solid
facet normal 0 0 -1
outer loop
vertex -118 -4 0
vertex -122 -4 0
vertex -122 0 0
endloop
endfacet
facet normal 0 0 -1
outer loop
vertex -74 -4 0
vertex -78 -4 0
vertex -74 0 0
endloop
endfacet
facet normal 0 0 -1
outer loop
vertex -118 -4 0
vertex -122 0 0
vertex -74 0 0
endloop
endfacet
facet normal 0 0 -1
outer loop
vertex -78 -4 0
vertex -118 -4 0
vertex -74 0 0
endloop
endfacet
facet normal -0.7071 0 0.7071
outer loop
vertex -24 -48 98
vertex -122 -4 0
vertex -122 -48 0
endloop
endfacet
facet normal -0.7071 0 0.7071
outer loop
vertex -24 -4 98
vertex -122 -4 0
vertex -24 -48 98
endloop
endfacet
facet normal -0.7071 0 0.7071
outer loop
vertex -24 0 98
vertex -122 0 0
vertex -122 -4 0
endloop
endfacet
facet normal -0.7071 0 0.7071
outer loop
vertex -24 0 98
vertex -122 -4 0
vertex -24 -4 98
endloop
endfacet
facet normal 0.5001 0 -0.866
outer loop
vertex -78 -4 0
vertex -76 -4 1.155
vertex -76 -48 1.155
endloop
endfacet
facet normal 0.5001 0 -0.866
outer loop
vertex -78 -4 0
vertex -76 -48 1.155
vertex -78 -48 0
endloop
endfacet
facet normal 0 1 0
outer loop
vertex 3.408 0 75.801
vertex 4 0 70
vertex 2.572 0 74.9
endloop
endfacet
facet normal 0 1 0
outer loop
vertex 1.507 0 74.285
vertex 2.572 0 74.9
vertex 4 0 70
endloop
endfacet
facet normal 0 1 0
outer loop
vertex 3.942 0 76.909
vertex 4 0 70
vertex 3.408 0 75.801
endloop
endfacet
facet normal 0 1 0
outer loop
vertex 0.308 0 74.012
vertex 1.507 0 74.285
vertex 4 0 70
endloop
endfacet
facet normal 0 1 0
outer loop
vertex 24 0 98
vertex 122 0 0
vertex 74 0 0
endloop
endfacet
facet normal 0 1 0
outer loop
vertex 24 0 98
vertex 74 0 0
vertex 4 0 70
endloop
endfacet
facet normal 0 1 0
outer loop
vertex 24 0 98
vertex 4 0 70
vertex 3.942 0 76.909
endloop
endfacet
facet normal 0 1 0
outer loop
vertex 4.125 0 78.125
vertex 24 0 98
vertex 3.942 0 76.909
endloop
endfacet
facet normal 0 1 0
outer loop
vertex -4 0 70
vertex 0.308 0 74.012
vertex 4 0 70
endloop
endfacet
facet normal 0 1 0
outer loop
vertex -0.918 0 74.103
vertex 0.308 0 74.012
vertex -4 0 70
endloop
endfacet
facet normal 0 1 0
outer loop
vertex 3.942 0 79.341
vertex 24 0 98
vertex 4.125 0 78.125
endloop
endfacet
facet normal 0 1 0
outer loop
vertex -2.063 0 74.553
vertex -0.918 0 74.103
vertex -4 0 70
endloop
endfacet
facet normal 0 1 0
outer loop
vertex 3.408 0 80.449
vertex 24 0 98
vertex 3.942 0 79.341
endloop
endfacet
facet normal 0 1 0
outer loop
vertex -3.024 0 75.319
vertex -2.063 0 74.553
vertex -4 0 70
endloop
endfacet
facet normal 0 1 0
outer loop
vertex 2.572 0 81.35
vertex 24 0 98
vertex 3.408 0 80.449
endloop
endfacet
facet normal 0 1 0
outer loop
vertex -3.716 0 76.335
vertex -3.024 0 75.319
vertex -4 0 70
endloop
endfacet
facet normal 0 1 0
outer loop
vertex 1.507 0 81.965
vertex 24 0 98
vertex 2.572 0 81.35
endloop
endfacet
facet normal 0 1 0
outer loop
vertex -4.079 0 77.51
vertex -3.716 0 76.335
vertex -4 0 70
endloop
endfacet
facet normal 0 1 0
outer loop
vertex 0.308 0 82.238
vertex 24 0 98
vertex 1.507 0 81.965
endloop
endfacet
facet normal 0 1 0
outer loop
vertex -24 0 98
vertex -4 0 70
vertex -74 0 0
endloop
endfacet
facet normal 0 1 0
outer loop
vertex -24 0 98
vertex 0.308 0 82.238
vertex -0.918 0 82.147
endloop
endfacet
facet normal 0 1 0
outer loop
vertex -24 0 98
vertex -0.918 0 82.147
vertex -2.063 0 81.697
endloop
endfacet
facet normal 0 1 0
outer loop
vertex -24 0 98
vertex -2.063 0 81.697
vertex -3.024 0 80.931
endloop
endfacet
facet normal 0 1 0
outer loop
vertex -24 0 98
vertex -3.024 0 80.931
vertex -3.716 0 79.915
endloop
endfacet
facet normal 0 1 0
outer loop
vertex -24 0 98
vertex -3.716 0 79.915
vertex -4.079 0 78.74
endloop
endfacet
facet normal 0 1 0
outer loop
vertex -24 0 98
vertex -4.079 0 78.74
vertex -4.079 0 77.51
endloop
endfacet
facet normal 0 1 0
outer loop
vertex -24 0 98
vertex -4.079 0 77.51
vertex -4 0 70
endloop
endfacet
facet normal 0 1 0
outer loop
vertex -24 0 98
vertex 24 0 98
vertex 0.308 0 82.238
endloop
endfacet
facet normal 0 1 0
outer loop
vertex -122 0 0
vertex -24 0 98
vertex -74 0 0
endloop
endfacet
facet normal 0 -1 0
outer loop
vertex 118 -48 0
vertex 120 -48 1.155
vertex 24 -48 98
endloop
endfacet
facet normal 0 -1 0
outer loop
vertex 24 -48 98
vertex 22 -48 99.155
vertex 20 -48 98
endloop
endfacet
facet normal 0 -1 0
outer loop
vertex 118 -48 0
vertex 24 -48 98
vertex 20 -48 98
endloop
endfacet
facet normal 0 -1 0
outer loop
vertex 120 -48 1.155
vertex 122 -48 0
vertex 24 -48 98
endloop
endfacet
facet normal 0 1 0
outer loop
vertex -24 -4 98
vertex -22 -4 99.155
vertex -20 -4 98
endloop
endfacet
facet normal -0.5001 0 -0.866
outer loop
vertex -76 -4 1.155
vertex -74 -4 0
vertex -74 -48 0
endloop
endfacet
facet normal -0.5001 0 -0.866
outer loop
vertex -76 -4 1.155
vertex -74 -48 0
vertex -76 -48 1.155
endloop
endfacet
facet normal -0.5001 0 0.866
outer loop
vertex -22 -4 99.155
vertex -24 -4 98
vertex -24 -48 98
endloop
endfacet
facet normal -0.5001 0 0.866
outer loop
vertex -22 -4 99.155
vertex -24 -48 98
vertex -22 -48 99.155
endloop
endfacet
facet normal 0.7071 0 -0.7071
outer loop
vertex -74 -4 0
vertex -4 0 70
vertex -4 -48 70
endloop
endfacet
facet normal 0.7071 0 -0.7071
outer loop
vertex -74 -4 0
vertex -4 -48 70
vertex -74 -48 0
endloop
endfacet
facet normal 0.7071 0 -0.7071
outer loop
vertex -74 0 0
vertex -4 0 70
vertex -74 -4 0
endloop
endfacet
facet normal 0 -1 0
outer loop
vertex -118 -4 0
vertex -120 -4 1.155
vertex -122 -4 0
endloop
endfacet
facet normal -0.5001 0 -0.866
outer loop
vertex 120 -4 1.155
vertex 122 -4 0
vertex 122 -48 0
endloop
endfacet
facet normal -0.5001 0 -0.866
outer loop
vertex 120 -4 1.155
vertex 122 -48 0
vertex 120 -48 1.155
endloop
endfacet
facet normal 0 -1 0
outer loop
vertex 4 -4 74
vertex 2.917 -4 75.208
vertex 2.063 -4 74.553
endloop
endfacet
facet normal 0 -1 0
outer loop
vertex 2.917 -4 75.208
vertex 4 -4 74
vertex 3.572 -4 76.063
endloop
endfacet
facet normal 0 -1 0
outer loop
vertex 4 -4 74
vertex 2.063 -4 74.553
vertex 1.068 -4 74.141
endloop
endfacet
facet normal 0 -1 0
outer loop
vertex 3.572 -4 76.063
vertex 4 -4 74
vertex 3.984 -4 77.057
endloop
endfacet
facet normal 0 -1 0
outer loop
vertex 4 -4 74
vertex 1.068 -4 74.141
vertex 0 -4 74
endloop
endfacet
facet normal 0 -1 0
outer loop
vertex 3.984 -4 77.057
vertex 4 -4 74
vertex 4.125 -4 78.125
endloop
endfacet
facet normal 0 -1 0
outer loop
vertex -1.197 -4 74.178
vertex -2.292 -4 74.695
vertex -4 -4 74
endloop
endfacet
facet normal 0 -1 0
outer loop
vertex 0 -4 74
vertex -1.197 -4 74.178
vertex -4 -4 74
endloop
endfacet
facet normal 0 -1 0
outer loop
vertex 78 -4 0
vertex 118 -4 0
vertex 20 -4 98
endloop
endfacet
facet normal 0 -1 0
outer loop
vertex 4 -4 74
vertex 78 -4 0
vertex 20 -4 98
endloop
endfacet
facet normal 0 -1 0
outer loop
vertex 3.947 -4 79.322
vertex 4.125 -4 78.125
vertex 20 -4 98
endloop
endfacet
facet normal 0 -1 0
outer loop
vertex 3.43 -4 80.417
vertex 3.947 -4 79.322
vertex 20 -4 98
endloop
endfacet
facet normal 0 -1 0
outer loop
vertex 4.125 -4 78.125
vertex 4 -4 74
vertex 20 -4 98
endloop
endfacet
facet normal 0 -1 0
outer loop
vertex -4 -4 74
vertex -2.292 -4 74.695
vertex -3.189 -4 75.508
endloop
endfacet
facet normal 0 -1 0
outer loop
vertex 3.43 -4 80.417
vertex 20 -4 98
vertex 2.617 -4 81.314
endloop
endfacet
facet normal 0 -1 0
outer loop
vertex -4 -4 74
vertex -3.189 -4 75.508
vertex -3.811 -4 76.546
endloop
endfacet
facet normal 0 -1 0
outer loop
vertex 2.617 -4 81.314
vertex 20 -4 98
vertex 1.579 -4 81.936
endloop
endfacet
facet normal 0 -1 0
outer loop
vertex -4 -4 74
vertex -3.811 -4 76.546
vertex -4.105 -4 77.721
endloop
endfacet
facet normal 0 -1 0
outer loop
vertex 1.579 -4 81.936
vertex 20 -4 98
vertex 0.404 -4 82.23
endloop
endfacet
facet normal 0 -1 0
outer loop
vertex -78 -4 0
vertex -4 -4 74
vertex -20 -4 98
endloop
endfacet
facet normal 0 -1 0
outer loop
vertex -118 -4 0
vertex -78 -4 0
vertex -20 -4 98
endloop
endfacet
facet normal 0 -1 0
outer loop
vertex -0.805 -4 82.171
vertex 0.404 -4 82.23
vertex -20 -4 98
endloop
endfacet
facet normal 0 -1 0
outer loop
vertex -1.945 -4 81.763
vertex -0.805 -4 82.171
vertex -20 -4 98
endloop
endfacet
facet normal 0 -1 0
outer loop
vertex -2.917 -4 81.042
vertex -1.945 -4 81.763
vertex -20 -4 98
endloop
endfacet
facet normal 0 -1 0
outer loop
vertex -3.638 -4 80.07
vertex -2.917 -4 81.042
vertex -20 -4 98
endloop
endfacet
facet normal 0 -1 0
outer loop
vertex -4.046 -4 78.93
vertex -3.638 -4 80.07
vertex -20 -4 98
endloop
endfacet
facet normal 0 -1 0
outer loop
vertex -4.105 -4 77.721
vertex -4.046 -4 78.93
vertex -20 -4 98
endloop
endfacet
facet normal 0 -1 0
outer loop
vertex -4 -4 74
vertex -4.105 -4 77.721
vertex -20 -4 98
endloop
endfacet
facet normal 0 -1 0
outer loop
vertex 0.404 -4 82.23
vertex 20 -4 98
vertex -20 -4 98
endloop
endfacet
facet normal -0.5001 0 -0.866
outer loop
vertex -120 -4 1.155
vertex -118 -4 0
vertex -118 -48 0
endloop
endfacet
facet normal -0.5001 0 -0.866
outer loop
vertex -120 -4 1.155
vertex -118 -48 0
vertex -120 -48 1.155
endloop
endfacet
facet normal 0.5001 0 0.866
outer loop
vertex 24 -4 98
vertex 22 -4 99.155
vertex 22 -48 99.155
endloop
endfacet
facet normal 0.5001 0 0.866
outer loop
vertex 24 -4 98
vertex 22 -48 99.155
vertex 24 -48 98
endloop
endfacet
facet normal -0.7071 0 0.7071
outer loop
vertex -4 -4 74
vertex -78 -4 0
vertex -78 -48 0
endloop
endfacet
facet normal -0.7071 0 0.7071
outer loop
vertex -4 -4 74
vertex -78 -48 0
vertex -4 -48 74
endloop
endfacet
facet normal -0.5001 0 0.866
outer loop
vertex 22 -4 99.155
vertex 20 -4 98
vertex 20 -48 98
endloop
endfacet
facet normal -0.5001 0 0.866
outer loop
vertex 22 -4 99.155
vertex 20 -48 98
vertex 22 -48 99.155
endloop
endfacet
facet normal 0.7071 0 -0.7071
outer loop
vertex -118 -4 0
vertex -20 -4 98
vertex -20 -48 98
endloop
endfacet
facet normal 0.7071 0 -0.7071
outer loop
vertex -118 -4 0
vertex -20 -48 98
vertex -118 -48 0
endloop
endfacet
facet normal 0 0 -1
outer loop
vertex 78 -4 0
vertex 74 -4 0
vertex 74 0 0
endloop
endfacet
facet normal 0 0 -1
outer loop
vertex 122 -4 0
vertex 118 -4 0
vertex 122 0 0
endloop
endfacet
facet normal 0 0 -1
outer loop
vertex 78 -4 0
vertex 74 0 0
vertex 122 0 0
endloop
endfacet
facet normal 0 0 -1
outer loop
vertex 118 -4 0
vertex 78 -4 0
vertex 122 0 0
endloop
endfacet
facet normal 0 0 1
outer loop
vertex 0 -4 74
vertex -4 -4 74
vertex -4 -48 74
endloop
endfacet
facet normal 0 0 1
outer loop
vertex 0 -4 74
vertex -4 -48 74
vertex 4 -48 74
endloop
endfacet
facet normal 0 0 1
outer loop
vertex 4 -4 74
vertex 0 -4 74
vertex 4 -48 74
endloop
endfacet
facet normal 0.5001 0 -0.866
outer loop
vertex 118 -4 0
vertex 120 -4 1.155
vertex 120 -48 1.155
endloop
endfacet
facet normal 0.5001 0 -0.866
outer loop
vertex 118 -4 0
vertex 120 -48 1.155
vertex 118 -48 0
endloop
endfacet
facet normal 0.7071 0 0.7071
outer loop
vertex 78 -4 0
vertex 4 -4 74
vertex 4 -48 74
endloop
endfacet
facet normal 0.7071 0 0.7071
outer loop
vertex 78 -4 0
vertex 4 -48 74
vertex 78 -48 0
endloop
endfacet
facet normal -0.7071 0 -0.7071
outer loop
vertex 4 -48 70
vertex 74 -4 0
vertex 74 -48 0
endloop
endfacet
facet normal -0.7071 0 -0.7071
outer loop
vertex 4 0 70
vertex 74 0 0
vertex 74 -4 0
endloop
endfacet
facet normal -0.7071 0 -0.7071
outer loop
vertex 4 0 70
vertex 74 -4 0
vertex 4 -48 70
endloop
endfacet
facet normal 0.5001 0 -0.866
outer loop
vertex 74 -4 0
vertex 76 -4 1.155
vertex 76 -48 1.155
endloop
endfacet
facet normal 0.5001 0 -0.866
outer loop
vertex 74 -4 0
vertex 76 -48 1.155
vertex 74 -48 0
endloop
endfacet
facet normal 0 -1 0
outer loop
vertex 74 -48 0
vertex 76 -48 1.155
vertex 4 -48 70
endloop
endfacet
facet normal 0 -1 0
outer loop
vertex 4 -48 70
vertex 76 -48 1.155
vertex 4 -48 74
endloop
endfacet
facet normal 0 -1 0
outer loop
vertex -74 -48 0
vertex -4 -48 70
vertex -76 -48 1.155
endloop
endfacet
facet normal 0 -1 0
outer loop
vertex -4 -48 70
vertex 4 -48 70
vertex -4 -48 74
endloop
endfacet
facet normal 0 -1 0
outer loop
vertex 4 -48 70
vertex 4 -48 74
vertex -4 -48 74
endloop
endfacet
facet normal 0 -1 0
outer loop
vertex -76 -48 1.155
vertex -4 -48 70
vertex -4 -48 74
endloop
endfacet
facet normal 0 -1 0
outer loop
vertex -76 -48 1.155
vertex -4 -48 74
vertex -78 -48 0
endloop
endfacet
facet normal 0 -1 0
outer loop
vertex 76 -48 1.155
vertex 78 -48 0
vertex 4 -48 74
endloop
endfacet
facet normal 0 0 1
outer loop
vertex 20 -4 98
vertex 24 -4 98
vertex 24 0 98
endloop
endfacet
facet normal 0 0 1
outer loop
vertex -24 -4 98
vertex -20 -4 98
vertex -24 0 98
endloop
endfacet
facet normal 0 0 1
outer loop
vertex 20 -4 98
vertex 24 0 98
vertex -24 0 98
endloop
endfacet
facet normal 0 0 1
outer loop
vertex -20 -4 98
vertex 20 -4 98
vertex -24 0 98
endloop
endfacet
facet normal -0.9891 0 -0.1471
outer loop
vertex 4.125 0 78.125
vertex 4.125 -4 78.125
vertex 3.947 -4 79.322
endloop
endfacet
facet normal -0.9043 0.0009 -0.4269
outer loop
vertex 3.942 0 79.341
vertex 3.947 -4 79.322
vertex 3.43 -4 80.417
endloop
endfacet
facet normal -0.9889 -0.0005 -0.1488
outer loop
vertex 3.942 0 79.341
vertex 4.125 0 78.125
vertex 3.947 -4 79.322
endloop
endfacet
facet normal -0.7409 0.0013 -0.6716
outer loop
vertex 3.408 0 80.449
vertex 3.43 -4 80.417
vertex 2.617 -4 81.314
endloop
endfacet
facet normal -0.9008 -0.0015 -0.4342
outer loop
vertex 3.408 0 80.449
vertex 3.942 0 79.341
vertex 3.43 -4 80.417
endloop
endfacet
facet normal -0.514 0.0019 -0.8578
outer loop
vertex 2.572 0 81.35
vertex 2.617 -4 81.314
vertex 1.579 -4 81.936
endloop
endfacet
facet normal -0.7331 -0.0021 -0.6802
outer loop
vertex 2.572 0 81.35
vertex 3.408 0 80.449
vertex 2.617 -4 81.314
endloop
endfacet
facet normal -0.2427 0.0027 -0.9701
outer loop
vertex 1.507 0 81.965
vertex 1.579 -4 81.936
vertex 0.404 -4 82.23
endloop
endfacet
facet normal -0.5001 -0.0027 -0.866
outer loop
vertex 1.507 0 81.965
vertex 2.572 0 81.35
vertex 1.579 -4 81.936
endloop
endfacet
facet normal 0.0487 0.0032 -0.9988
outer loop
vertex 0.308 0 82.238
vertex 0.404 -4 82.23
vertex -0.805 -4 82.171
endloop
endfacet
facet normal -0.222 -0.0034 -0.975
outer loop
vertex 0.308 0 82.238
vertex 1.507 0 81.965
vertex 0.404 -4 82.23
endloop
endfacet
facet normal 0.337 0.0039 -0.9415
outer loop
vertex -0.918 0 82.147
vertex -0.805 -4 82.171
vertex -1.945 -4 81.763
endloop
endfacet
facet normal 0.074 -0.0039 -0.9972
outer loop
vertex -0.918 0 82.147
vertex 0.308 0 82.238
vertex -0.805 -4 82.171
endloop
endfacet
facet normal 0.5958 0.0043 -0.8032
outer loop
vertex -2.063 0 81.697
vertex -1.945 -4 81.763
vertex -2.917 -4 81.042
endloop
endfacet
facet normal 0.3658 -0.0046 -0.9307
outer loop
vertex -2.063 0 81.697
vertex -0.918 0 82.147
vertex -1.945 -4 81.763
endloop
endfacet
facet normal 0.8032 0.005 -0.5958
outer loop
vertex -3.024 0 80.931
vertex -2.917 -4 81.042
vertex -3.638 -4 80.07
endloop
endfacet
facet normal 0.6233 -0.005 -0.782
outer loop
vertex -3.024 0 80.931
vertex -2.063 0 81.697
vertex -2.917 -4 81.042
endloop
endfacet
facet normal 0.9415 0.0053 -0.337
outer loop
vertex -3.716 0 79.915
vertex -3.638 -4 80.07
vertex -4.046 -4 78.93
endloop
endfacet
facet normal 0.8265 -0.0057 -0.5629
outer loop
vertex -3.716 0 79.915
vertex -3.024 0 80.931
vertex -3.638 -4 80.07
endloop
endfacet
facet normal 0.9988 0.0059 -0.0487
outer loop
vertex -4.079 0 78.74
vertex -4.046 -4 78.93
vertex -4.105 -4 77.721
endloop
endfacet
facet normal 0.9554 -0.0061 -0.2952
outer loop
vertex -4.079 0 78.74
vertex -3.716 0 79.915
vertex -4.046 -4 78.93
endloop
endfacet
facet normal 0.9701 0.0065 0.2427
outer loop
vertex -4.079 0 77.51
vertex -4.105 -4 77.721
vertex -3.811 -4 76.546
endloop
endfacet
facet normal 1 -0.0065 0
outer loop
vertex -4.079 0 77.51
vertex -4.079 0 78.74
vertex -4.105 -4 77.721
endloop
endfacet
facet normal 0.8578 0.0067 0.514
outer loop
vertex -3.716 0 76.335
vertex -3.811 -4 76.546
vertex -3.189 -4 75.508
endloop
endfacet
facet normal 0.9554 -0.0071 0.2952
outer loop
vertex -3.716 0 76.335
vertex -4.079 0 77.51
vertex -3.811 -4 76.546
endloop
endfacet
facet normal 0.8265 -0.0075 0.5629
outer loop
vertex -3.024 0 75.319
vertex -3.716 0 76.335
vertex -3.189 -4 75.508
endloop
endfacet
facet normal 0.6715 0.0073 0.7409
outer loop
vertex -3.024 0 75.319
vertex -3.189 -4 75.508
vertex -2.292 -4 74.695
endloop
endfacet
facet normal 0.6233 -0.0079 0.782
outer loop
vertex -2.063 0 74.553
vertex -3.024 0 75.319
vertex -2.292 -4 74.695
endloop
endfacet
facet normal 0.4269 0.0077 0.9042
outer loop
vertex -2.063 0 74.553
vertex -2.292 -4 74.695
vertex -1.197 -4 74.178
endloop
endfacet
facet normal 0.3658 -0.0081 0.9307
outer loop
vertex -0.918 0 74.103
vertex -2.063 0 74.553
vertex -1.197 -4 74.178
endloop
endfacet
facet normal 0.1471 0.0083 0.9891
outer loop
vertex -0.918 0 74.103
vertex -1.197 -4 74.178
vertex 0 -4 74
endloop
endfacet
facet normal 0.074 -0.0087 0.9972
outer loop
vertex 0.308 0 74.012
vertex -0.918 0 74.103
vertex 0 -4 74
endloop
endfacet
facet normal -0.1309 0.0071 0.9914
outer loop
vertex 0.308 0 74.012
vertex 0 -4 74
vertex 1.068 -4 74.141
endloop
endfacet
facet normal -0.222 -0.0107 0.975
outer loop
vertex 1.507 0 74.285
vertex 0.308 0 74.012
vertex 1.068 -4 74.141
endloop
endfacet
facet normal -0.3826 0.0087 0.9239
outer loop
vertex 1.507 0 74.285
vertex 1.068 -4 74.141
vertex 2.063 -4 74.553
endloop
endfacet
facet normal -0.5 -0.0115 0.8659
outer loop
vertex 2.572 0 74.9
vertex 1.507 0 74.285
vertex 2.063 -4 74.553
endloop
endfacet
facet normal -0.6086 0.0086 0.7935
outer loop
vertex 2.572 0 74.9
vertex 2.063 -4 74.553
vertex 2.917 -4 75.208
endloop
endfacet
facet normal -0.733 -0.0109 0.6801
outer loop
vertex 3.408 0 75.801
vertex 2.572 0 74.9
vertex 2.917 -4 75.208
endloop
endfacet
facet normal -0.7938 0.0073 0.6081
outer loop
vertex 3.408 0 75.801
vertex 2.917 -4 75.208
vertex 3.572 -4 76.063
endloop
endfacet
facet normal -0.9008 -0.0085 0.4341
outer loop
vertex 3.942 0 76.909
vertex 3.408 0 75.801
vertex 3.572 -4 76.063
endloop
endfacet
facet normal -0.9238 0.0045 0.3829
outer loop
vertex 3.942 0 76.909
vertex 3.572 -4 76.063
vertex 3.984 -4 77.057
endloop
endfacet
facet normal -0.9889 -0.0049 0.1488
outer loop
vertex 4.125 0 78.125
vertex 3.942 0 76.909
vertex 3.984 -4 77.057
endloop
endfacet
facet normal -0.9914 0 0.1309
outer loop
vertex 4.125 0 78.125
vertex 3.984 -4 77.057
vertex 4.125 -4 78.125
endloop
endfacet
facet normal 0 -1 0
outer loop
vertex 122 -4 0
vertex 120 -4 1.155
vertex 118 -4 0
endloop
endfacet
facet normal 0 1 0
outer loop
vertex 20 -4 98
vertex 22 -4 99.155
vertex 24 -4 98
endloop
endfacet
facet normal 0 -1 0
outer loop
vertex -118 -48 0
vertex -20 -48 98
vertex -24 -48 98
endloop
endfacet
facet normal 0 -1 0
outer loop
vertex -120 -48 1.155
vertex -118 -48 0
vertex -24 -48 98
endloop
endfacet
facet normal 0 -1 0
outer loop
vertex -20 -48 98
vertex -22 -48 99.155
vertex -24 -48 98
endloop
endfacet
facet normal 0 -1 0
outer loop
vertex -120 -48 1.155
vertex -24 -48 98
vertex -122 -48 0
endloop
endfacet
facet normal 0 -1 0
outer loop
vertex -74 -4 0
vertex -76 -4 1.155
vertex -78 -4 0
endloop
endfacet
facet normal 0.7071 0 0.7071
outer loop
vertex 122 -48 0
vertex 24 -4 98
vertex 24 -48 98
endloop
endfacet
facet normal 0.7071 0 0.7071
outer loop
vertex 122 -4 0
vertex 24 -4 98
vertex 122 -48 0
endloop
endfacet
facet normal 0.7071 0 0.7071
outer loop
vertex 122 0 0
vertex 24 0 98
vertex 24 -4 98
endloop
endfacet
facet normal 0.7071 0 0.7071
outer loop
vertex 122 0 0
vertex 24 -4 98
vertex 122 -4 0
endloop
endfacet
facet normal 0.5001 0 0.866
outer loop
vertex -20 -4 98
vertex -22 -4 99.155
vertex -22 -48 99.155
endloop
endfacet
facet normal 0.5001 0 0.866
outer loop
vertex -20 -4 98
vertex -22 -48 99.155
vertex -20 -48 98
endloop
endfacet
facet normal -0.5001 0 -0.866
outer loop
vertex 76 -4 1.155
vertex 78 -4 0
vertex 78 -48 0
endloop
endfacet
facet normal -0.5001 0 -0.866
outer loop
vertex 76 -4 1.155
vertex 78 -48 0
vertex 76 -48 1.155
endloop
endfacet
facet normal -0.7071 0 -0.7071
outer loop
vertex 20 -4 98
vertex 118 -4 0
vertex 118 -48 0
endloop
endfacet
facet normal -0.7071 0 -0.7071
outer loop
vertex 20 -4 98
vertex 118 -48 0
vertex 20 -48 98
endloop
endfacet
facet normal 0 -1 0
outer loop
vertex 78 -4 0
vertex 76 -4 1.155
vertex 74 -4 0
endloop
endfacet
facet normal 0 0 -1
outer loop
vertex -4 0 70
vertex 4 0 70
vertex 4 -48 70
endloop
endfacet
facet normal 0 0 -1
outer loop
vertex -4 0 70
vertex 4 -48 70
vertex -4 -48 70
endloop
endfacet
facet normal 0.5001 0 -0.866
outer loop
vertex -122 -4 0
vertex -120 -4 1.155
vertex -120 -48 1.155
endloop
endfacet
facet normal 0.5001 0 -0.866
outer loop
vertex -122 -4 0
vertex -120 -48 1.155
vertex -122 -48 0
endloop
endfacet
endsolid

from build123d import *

# Parameters (mm, degrees)
SKETCH007_R      = 4.125
EXTRUDE009_DEPTH = 4
EXTRUDE008_DEPTH = 44


with BuildPart() as extrude009:
    # Sketch007 → Extrude009 (new body)
    with BuildSketch(Plane.XZ):
        Polygon((-24, 98), (-20, 98), (20, 98), (24, 98), (122, 0), (118, 0), (78, 0), (74, 0), (4, 70), (-4, 70), (-74, 0), (-78, 0), (-118, 0), (-122, 0), align=None)
        with Locations((0, 78.125)):
            Circle(SKETCH007_R, mode=Mode.SUBTRACT)
    extrude(amount=EXTRUDE009_DEPTH)


with BuildPart() as stage_2_paths:
    # Sketch006 → Extrude008 (new body)
    with BuildSketch(Plane.XZ):
        Polygon((-20, 98), (-118, 0), (-120, 1.154701), (-122, 0), (-24, 98), (-22, 99.154701), align=None)
        Polygon((118, 0), (20, 98), (22, 99.154701), (24, 98), (122, 0), (120, 1.154701), align=None)
        Polygon((-4, 70), (-74, 0), (-76, 1.154701), (-78, 0), (-4, 74), (4, 74), (78, 0), (76, 1.154701), (74, 0), (4, 70), align=None)
    extrude(amount=EXTRUDE008_DEPTH)


with BuildPart() as stage_2_paths_1:
    # Extrude008 placement: moved
    add(stage_2_paths.part.moved(Location((0, -4, 0))))

    # Fusion002: union Extrude009
    add(extrude009.part)


solid = stage_2_paths_1.part
